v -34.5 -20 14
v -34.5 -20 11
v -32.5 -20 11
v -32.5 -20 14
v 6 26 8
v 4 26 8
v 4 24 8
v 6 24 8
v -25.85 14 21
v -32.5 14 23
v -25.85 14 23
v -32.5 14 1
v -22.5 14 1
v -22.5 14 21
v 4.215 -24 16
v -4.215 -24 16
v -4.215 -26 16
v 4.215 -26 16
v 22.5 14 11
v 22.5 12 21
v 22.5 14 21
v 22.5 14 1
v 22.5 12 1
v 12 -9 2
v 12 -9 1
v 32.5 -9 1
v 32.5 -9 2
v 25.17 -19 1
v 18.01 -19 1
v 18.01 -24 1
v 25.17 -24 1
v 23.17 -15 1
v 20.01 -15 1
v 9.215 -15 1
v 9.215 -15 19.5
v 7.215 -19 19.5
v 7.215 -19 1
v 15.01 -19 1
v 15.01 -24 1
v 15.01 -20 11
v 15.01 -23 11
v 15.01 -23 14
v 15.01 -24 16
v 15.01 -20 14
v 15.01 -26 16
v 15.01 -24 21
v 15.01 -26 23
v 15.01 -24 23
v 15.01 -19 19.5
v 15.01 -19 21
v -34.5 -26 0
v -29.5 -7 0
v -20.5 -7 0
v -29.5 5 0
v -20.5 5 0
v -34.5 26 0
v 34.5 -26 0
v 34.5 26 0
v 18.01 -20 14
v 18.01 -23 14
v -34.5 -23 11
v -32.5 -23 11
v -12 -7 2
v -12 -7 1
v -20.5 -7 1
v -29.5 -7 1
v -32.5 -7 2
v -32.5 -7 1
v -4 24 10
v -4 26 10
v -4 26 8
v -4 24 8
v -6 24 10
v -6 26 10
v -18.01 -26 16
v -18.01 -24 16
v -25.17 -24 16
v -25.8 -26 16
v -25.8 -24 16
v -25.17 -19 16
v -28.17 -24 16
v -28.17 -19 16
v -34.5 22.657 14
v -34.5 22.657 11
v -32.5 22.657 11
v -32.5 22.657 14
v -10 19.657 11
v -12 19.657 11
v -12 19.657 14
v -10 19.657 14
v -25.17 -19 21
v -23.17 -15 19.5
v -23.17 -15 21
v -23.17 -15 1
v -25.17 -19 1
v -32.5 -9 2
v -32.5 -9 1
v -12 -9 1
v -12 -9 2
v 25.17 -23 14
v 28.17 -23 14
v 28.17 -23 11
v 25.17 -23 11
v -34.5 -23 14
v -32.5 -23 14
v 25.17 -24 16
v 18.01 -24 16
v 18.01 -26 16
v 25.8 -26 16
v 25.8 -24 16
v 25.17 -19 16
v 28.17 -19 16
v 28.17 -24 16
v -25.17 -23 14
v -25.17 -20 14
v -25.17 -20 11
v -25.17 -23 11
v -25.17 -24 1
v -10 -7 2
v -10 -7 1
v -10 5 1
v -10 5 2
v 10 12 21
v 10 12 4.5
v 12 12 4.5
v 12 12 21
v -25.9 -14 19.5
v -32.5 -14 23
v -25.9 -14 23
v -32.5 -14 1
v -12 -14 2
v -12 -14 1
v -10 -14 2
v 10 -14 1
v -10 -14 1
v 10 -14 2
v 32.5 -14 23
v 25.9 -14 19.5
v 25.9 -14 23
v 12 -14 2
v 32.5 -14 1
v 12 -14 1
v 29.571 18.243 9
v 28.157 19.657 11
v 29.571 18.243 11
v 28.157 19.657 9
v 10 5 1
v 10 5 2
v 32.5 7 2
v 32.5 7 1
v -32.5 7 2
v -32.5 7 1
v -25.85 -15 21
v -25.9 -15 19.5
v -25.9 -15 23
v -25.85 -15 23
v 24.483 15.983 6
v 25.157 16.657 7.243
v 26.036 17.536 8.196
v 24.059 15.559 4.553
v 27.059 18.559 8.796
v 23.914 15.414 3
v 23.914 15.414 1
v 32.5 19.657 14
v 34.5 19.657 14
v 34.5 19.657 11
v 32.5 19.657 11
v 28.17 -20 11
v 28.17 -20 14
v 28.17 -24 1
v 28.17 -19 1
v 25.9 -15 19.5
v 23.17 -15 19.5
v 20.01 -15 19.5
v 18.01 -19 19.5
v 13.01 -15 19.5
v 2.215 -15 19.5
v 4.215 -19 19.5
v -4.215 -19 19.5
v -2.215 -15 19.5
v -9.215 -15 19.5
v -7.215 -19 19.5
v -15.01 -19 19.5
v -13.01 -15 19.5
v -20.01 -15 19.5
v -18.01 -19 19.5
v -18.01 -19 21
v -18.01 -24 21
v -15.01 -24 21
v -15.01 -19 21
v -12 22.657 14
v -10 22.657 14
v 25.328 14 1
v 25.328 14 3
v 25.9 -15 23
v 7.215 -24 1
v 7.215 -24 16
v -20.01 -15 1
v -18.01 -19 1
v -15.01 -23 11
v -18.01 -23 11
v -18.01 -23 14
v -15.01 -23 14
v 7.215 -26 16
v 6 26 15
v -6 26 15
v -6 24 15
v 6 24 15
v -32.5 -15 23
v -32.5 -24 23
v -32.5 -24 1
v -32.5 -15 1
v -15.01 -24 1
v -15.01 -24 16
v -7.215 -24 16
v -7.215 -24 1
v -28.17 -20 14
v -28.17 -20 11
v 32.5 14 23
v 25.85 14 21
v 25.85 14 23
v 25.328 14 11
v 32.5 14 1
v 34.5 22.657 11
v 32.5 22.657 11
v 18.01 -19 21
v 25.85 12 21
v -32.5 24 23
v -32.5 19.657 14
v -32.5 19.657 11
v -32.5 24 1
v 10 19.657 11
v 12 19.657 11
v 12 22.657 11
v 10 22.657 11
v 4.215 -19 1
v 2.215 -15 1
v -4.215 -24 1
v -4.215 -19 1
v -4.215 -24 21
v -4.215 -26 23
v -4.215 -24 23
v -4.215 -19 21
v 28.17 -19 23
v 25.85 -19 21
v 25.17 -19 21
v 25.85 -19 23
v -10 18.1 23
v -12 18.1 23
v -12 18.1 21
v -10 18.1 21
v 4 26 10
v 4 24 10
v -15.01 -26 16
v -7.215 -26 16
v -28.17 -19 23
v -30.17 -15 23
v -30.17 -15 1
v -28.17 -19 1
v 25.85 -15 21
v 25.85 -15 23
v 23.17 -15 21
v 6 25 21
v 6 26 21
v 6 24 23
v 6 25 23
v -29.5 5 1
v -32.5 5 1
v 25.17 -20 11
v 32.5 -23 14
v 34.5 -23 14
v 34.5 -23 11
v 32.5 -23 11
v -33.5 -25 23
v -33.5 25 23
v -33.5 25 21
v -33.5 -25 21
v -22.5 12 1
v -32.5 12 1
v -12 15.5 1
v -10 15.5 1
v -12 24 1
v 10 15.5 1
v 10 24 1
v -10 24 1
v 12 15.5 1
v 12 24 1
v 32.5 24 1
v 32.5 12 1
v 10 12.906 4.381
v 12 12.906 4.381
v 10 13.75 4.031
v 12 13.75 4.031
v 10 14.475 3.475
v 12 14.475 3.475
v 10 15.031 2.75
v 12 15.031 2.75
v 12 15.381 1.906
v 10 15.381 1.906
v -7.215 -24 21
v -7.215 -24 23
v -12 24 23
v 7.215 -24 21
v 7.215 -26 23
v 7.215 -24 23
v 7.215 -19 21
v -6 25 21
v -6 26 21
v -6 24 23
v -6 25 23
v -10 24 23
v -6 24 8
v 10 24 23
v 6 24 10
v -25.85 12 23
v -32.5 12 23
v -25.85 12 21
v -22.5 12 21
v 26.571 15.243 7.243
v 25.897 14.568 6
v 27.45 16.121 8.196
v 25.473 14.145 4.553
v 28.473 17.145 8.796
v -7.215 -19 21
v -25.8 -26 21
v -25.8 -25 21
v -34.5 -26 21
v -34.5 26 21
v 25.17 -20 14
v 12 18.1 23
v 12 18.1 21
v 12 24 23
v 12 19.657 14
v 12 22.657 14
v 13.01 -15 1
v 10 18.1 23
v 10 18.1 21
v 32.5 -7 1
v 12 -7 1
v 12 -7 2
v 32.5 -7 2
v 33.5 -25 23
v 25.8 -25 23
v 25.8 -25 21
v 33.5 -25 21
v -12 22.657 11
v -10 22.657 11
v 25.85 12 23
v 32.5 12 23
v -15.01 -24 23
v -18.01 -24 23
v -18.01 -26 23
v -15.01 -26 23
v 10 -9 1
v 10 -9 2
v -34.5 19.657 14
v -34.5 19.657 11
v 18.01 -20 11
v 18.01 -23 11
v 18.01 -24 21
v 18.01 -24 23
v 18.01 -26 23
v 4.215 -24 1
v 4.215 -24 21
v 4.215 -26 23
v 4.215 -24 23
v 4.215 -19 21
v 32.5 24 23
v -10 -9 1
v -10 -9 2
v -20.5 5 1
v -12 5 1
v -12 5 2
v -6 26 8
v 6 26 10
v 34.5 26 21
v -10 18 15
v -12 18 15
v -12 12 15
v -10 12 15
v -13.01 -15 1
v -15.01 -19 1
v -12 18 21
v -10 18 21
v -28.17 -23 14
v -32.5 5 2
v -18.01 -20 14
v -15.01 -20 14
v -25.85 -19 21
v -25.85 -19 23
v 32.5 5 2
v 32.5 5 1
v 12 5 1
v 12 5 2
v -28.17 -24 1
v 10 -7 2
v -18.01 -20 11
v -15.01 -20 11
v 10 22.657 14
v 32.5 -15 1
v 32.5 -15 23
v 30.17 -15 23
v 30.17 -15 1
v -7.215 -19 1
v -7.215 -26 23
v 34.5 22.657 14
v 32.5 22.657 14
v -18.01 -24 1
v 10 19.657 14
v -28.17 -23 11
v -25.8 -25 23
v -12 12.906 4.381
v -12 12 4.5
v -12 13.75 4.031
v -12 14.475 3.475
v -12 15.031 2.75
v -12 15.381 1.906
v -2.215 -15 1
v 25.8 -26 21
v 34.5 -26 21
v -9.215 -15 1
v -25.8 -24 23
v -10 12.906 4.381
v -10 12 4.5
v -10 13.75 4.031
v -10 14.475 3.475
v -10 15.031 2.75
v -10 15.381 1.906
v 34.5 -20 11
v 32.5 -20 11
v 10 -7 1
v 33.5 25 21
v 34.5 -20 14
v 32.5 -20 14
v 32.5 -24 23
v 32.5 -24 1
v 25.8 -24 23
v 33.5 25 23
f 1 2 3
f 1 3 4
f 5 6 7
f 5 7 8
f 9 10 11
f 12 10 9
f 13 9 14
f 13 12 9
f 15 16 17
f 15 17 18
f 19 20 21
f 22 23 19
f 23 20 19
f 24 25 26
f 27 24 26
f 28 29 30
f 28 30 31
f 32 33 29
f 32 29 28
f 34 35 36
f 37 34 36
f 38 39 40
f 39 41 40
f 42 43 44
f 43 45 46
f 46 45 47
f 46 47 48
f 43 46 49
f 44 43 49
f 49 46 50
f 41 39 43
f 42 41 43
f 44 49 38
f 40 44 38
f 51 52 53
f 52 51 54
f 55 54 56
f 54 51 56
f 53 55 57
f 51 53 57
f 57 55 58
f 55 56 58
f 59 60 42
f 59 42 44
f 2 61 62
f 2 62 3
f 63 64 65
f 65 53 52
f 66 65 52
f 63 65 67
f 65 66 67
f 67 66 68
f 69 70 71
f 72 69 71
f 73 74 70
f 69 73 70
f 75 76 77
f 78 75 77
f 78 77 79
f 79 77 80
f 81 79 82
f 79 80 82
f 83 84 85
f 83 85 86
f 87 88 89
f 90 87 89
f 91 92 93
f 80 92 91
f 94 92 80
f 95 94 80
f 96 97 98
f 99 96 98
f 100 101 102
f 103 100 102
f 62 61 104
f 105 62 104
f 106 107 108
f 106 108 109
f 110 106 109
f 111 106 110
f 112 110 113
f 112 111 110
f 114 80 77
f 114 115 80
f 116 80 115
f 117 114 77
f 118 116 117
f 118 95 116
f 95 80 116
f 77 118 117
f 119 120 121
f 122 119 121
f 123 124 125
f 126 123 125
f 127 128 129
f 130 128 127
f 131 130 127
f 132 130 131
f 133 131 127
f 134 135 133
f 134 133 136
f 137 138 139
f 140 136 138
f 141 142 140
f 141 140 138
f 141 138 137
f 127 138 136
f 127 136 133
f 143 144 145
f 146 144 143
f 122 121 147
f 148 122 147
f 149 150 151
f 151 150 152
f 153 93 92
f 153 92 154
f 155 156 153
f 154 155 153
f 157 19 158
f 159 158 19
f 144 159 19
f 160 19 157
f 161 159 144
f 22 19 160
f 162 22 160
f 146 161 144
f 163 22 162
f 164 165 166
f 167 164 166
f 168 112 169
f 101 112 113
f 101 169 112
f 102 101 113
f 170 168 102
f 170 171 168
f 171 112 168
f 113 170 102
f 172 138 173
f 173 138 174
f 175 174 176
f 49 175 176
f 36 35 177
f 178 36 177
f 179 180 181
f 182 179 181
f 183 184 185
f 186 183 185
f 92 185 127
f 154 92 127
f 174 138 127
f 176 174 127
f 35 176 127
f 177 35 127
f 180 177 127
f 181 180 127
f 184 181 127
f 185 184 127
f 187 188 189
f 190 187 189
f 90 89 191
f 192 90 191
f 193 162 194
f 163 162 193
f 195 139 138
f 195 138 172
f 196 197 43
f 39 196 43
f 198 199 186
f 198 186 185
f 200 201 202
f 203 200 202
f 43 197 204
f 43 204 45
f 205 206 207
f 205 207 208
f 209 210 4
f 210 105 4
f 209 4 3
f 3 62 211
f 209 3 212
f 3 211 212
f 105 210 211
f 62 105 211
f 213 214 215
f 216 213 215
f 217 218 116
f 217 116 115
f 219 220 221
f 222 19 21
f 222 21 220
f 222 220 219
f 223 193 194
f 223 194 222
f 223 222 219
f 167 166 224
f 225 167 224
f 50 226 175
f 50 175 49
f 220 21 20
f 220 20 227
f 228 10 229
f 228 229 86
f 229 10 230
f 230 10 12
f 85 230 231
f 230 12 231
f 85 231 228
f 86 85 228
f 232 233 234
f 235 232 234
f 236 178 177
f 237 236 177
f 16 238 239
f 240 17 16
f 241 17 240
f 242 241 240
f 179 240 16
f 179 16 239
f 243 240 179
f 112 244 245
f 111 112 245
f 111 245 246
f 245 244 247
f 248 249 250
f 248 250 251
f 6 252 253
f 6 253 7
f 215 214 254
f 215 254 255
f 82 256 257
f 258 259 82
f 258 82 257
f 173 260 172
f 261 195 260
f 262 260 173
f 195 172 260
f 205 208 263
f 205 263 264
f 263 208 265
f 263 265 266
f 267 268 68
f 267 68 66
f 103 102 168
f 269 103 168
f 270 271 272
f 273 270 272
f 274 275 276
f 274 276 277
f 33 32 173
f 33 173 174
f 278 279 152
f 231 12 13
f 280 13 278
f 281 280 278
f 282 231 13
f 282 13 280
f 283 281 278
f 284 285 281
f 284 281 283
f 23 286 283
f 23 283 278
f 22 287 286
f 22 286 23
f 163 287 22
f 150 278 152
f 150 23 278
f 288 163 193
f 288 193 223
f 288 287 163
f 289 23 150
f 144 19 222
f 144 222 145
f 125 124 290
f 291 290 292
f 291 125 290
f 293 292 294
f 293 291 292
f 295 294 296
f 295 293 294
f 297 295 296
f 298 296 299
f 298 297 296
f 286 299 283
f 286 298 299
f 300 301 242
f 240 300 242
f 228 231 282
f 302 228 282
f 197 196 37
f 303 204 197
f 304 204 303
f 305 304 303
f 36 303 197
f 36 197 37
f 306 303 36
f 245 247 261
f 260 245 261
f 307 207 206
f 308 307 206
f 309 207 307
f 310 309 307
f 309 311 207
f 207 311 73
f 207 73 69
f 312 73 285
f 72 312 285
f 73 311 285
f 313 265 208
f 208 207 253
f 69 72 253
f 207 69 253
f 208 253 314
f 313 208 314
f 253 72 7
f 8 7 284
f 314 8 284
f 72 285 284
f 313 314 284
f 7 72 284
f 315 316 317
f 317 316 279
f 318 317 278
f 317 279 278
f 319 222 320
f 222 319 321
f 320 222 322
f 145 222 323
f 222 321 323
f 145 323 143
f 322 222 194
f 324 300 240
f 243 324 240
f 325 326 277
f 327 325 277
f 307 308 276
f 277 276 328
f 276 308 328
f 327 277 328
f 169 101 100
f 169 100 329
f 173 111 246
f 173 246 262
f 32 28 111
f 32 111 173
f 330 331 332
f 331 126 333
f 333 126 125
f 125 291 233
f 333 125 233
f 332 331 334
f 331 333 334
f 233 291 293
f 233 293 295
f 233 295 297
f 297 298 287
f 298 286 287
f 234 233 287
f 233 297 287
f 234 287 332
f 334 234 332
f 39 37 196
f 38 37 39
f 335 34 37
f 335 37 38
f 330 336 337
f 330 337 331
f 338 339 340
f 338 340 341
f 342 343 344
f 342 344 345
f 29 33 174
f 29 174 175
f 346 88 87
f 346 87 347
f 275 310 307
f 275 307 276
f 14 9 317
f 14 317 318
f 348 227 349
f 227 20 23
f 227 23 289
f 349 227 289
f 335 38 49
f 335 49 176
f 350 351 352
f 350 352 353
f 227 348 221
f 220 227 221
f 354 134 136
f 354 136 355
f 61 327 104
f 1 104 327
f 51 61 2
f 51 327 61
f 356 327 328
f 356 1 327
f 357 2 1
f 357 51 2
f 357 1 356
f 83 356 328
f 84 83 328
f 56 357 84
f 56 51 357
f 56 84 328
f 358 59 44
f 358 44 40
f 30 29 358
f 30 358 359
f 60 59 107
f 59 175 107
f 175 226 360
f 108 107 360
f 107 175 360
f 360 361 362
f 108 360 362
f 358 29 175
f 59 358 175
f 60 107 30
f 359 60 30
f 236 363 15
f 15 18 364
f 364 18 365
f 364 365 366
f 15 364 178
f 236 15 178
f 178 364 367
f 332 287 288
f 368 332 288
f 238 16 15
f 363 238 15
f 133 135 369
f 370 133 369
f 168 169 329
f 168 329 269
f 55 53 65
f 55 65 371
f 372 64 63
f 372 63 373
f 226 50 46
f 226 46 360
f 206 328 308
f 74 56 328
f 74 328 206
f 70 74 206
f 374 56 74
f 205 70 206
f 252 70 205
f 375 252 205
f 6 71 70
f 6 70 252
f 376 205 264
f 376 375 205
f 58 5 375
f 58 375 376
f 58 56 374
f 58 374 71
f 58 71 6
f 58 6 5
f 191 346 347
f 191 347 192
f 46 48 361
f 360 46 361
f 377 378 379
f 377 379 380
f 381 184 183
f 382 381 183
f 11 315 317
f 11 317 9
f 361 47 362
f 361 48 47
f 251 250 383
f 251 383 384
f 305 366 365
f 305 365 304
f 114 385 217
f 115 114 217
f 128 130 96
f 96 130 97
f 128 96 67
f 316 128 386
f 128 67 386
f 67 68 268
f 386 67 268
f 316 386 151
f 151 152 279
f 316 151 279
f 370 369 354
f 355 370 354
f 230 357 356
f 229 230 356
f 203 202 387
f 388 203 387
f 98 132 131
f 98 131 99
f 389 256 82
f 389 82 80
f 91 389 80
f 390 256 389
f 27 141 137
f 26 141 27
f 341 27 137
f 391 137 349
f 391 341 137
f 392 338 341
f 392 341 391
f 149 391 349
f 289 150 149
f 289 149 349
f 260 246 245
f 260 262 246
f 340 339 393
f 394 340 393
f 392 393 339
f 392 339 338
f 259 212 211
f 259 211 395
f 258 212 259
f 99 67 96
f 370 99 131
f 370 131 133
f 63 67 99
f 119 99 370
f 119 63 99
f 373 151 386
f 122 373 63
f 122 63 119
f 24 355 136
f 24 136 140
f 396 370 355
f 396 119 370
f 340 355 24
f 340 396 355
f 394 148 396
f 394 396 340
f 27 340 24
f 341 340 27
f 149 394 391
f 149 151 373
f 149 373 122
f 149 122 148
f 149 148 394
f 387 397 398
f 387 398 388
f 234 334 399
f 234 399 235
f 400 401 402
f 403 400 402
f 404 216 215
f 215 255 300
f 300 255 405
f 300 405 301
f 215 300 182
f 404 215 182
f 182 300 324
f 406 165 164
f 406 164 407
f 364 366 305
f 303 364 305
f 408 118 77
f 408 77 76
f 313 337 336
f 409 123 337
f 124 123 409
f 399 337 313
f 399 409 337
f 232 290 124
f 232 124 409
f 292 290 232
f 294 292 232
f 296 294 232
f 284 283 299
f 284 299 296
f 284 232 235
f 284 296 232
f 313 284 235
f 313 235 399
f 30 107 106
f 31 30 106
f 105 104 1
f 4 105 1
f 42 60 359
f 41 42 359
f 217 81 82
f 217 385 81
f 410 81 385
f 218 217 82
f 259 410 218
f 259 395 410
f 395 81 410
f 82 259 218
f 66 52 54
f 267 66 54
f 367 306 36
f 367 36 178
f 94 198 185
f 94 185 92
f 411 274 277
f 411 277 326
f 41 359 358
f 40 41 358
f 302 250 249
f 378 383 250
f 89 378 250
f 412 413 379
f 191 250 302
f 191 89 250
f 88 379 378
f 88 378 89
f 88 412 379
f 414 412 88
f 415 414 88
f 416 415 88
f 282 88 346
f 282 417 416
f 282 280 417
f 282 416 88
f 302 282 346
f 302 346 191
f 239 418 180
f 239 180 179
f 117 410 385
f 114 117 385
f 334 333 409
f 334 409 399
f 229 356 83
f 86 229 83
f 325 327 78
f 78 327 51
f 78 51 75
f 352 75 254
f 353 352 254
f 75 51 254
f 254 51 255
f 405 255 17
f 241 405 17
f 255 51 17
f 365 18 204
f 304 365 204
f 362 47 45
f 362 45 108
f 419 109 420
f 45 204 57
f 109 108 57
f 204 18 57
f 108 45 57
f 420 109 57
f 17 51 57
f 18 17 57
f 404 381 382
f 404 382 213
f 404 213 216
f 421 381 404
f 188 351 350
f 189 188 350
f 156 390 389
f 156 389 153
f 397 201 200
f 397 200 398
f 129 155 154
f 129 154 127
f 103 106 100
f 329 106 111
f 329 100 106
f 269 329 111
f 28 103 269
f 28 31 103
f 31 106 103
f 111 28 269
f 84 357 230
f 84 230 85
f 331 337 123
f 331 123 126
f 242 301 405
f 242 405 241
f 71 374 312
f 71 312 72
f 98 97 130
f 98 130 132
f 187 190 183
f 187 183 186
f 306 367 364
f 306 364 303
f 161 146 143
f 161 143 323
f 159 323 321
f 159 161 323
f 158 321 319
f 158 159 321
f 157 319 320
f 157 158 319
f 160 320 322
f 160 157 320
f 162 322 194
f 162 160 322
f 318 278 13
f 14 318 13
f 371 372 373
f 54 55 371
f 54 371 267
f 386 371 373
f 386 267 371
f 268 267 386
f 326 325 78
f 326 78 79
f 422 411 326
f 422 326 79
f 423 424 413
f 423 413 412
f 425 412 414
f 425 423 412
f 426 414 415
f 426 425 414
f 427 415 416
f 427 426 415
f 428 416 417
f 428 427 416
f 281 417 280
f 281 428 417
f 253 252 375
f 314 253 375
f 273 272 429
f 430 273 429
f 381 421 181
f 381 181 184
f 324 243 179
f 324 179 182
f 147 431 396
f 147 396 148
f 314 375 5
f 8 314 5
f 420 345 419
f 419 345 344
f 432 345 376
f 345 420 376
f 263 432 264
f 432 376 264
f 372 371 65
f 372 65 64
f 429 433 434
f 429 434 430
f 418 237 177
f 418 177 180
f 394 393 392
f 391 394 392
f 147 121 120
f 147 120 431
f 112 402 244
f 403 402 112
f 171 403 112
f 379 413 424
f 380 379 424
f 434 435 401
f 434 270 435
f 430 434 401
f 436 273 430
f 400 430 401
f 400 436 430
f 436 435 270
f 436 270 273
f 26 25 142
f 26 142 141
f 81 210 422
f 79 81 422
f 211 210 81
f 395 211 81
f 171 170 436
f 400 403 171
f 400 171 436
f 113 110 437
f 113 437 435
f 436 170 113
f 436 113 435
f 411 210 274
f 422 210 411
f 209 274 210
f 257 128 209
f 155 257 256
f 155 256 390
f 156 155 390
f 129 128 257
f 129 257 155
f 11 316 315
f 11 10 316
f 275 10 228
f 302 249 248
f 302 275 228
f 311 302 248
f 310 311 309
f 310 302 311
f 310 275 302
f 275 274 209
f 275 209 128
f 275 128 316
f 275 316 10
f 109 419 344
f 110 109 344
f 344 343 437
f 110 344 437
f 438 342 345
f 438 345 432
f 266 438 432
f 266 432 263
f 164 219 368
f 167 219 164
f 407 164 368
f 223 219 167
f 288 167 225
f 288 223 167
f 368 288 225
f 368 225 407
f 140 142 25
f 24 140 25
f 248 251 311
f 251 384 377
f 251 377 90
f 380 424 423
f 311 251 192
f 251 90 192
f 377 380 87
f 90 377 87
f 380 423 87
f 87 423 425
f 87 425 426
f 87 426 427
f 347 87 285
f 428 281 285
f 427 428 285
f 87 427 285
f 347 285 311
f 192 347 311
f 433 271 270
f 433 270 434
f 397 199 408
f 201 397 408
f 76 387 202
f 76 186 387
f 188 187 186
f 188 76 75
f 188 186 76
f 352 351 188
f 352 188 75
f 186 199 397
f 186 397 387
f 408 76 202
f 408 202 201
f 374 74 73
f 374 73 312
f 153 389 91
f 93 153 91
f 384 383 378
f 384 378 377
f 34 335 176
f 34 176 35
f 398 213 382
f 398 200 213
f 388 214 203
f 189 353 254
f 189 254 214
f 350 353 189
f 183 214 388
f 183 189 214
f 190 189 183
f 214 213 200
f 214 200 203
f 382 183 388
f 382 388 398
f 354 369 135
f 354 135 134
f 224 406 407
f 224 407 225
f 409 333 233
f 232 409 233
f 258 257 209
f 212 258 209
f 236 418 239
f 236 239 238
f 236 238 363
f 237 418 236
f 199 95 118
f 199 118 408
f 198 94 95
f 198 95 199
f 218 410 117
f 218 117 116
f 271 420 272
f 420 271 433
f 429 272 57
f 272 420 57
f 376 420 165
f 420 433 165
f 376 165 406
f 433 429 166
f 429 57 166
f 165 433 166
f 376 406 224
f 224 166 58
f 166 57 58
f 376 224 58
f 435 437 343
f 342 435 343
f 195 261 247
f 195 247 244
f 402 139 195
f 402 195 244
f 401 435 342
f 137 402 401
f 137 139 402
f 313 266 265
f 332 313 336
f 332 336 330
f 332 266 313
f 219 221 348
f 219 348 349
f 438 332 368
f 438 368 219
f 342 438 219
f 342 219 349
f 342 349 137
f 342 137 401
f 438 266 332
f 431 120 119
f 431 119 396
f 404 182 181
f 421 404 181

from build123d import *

# Parameters (mm, degrees)
SKICA1_W                    = 69
SKICA1_H                    = 52
SKICA1_W_2                  = 65
SKICA1_H_2                  = 48
VYSUNOUT_TENKOST_NN_1_DEPTH = 23
SKICA2_W                    = 10
SKICA2_H                    = 2
SKICA2_W_2                  = 2
SKICA2_H_2                  = 12
P_IDAT_EBRA_DEPTH           = 23
SKICA3_W                    = 2
SKICA3_H                    = 6
SKICA3_W_2                  = 12
SKICA3_H_2                  = 2
ODEBRAT_8_MM_DEPTH          = 8
SKICA4_W                    = 8.43
SKICA4_H                    = 2
SKICA4_W_2                  = 7.795
ODEBRAT_7_MM_DEPTH          = 7
ODEBRAT_3_5_MM_DEPTH        = 3.5
SKICA6_W                    = 51.7
SKICA6_H                    = 42.1
ODEBRAT_2_MM_DEPTH          = 2
SKICA8_W                    = 69
SKICA8_H                    = 52
P_IDAT_DNO_DEPTH            = 1
SKICA9_W                    = 2
SKICA9_H                    = 21
SKICA9_W_2                  = 65
SKICA9_H_2                  = 2
P_IDAT_EBRA_DNO_DEPTH       = 2
SKICA10_W                   = 9
SKICA10_H                   = 12
ODEBRAT_VYP_NA_DEPTH        = 24
P_IDAT_H_EK_DEPTH           = 2
SKICA12_W                   = 3
SKICA12_H                   = 3
ODEBRAT_VYSUNUT_M1_DEPTH    = 24.5
SKICA13_W                   = 3
SKICA13_H                   = 3
ODEBRAT_VYSUNUT_M2_DEPTH    = 24.5
ODEBRAT_VYSUNUT_M3_REACH    = 54
SKICA14_W                   = 2
SKICA14_H                   = 2
ODEBRAT_VYSUNUT_M4_DEPTH    = 24


with BuildPart() as part:
    # Skica1 → Vysunout tenkost_nn_1 (new body)
    with BuildSketch(Plane.XY):
        Rectangle(SKICA1_W, SKICA1_H)
        Rectangle(SKICA1_W_2, SKICA1_H_2, mode=Mode.SUBTRACT)
    extrude(amount=VYSUNOUT_TENKOST_NN_1_DEPTH)

    # Skica2 → P_idat _ebra (add)
    with BuildSketch(Plane.XY):
        Polygon((-32.5, -15), (-32.5, -14), (32.5, -14), (32.5, -15), (30.17, -15), (28.17, -19), (28.17, -24), (25.17, -24), (25.17, -19), (23.17, -15), (20.01, -15), (18.01, -19), (18.01, -24), (15.01, -24), (15.01, -19), (13.01, -15), (9.215, -15), (7.215, -19), (7.215, -24), (4.215, -24), (4.215, -19), (2.215, -15), (-2.215, -15), (-4.215, -19), (-4.215, -24), (-7.215, -24), (-7.215, -19), (-9.215, -15), (-13.01, -15), (-15.01, -19), (-15.01, -24), (-18.01, -24), (-18.01, -19), (-20.01, -15), (-23.17, -15), (-25.17, -19), (-25.17, -24), (-28.17, -24), (-28.17, -19), (-30.17, -15), align=None)
        with Locations((-27.5, 13)):
            Rectangle(SKICA2_W, SKICA2_H)
        with Locations((27.5, 13)):
            Rectangle(SKICA2_W, SKICA2_H)
        with Locations((11, 18)):
            Rectangle(SKICA2_W_2, SKICA2_H_2)
        with Locations((-11, 18)):
            Rectangle(SKICA2_W_2, SKICA2_H_2)
    extrude(amount=P_IDAT_EBRA_DEPTH)

    # Skica3 → Odebrat 8 mm (cut)
    with BuildSketch(Plane.XY.offset(23)):
        with Locations((-11, 15)):
            Rectangle(SKICA3_W, SKICA3_H)
        with Locations((0, 25)):
            Rectangle(SKICA3_W_2, SKICA3_H_2)
    extrude(amount=-ODEBRAT_8_MM_DEPTH, mode=Mode.SUBTRACT)

    # Skica4 → Odebrat 7 mm (cut)
    with BuildSketch(Plane.XY.offset(23)):
        with Locations((0, -25)):
            Rectangle(SKICA4_W, SKICA4_H)
        with Locations((11.1125, -25)):
            Rectangle(SKICA4_W_2, SKICA4_H)
        with Locations((-11.1125, -25)):
            Rectangle(SKICA4_W_2, SKICA4_H)
        Polygon((18.01, -24), (18.01, -26), (25.8, -26), (25.8, -24), (28.17, -24), (28.17, -19), (25.17, -19), (25.17, -24), align=None)
        Polygon((-18.01, -24), (-18.01, -26), (-25.8, -26), (-25.8, -24), (-28.17, -24), (-28.17, -19), (-25.17, -19), (-25.17, -24), align=None)
    extrude(amount=-ODEBRAT_7_MM_DEPTH, mode=Mode.SUBTRACT)

    # Skica5 → Odebrat 3_5 mm (cut)
    with BuildSketch(Plane.XY.offset(23)):
        Polygon((-25.9, -13), (25.9, -13), (25.9, -15), (20.01, -15), (20.01, -19), (-20.01, -19), (-20.01, -15), (-25.9, -15), align=None)
    extrude(amount=-ODEBRAT_3_5_MM_DEPTH, mode=Mode.SUBTRACT)

    # Skica6 → Odebrat 2 mm (cut)
    with BuildSketch(Plane.XY.offset(23)):
        with Locations((0, -2.95)):
            Rectangle(SKICA6_W, SKICA6_H)
        Polygon((-34.5, 26), (34.5, 26), (34.5, -26), (25.8, -26), (25.8, -25), (33.5, -25), (33.5, 25), (-33.5, 25), (-33.5, -25), (-25.8, -25), (-25.8, -26), (-34.5, -26), align=None)
    extrude(amount=-ODEBRAT_2_MM_DEPTH, mode=Mode.SUBTRACT)

    # Skica8 → P_idat dno (add)
    with BuildSketch(Plane.XY):
        Rectangle(SKICA8_W, SKICA8_H)
    extrude(amount=P_IDAT_DNO_DEPTH)

    # Skica9 → P_idat _ebra _dno (add)
    with BuildSketch(Plane.XY):
        with Locations((-11, -3.5)):
            Rectangle(SKICA9_W, SKICA9_H)
        with Locations((11, -3.5)):
            Rectangle(SKICA9_W, SKICA9_H)
        with Locations((0, 6)):
            Rectangle(SKICA9_W_2, SKICA9_H_2)
        with Locations((0, -8)):
            Rectangle(SKICA9_W_2, SKICA9_H_2)
    extrude(amount=P_IDAT_EBRA_DNO_DEPTH)

    # Skica10 → Odebrat vyp_na (cut, through all)
    with BuildSketch(Plane(origin=(0, 0, 0), x_dir=(-1, 0, 0), z_dir=(0, 0, -1))):
        with Locations((25, -1)):
            Rectangle(SKICA10_W, SKICA10_H)
    extrude(amount=-ODEBRAT_VYP_NA_DEPTH, mode=Mode.SUBTRACT)

    # Skica11 → P_idat h_ek (add)
    with BuildSketch(Plane(origin=(4.25, -4.25, 0), x_dir=(0.707106781, 0.707106781, 0), z_dir=(-0.707106781, 0.707106781, 0))):
        with BuildLine():
            Line((25.809397513, -1), (25.809397513, -11))
            Line((25.809397513, -11), (33.809397513, -11))
            Line((33.809397513, -11), (33.809397513, -9))
            ThreePointArc((33.809397513, -9), (29.566756826, -7.242640687), (27.809397513, -3))
            Line((27.809397513, -3), (27.809397513, -1))
            Line((27.809397513, -1), (25.809397513, -1))
        make_face()
    extrude(amount=-P_IDAT_H_EK_DEPTH)

    # Skica12 → Odebrat vysunut_m1 (cut)
    with BuildSketch(Plane(origin=(34.5, 0, 0), x_dir=(0, 0, -1), z_dir=(1, 0, 0))):
        with Locations((-12.5, 21.156854249)):
            Rectangle(SKICA12_W, SKICA12_H)
        with Locations((-12.5, -21.5)):
            Rectangle(SKICA12_W, SKICA12_H)
    extrude(amount=-ODEBRAT_VYSUNUT_M1_DEPTH, mode=Mode.SUBTRACT)

    # Skica13 → Odebrat vysunut_m2 (cut)
    with BuildSketch(Plane.ZY.offset(34.5)):
        with Locations((12.5, 21.156854249)):
            Rectangle(SKICA13_W, SKICA13_H)
        with Locations((12.5, -21.5)):
            Rectangle(SKICA13_W, SKICA13_H)
    extrude(amount=-ODEBRAT_VYSUNUT_M2_DEPTH, mode=Mode.SUBTRACT)

    # Skica14 → Odebrat vysunut_m3 (cut, up to next)
    with BuildSketch(Plane(origin=(0, 26, 0), x_dir=(1, 0, 0), z_dir=(0, 1, 0)), mode=Mode.PRIVATE) as odebrat_vysunut_m3_sk1:
        with Locations((5, -9)):
            Rectangle(SKICA14_W, SKICA14_H)
    odebrat_vysunut_m3_tool1 = extrude(odebrat_vysunut_m3_sk1.sketch, amount=-ODEBRAT_VYSUNUT_M3_REACH, mode=Mode.PRIVATE) & part.part
    add(odebrat_vysunut_m3_tool1.solids().sort_by_distance((5, 26, 9))[0], mode=Mode.SUBTRACT)
    # Skica14 → Odebrat vysunut_m3 (cut, up to next)
    with BuildSketch(Plane(origin=(0, 26, 0), x_dir=(1, 0, 0), z_dir=(0, 1, 0)), mode=Mode.PRIVATE) as odebrat_vysunut_m3_sk2:
        with Locations((-5, -9)):
            Rectangle(SKICA14_W, SKICA14_H)
    odebrat_vysunut_m3_tool2 = extrude(odebrat_vysunut_m3_sk2.sketch, amount=-ODEBRAT_VYSUNUT_M3_REACH, mode=Mode.PRIVATE) & part.part
    add(odebrat_vysunut_m3_tool2.solids().sort_by_distance((-5, 26, 9))[0], mode=Mode.SUBTRACT)

    # Skica15 → Odebrat vysunut_m4 (cut)
    with BuildSketch(Plane(origin=(12, 0, 0), x_dir=(0, 0, -1), z_dir=(1, 0, 0))):
        with BuildLine():
            Line((-1, 15.5), (-1, 12))
            Line((-1, 12), (-4.5, 12))
            ThreePointArc((-4.5, 12), (-3.474873734, 14.474873734), (-1, 15.5))
        make_face()
    extrude(amount=-ODEBRAT_VYSUNUT_M4_DEPTH, mode=Mode.SUBTRACT)


solid = part.part
